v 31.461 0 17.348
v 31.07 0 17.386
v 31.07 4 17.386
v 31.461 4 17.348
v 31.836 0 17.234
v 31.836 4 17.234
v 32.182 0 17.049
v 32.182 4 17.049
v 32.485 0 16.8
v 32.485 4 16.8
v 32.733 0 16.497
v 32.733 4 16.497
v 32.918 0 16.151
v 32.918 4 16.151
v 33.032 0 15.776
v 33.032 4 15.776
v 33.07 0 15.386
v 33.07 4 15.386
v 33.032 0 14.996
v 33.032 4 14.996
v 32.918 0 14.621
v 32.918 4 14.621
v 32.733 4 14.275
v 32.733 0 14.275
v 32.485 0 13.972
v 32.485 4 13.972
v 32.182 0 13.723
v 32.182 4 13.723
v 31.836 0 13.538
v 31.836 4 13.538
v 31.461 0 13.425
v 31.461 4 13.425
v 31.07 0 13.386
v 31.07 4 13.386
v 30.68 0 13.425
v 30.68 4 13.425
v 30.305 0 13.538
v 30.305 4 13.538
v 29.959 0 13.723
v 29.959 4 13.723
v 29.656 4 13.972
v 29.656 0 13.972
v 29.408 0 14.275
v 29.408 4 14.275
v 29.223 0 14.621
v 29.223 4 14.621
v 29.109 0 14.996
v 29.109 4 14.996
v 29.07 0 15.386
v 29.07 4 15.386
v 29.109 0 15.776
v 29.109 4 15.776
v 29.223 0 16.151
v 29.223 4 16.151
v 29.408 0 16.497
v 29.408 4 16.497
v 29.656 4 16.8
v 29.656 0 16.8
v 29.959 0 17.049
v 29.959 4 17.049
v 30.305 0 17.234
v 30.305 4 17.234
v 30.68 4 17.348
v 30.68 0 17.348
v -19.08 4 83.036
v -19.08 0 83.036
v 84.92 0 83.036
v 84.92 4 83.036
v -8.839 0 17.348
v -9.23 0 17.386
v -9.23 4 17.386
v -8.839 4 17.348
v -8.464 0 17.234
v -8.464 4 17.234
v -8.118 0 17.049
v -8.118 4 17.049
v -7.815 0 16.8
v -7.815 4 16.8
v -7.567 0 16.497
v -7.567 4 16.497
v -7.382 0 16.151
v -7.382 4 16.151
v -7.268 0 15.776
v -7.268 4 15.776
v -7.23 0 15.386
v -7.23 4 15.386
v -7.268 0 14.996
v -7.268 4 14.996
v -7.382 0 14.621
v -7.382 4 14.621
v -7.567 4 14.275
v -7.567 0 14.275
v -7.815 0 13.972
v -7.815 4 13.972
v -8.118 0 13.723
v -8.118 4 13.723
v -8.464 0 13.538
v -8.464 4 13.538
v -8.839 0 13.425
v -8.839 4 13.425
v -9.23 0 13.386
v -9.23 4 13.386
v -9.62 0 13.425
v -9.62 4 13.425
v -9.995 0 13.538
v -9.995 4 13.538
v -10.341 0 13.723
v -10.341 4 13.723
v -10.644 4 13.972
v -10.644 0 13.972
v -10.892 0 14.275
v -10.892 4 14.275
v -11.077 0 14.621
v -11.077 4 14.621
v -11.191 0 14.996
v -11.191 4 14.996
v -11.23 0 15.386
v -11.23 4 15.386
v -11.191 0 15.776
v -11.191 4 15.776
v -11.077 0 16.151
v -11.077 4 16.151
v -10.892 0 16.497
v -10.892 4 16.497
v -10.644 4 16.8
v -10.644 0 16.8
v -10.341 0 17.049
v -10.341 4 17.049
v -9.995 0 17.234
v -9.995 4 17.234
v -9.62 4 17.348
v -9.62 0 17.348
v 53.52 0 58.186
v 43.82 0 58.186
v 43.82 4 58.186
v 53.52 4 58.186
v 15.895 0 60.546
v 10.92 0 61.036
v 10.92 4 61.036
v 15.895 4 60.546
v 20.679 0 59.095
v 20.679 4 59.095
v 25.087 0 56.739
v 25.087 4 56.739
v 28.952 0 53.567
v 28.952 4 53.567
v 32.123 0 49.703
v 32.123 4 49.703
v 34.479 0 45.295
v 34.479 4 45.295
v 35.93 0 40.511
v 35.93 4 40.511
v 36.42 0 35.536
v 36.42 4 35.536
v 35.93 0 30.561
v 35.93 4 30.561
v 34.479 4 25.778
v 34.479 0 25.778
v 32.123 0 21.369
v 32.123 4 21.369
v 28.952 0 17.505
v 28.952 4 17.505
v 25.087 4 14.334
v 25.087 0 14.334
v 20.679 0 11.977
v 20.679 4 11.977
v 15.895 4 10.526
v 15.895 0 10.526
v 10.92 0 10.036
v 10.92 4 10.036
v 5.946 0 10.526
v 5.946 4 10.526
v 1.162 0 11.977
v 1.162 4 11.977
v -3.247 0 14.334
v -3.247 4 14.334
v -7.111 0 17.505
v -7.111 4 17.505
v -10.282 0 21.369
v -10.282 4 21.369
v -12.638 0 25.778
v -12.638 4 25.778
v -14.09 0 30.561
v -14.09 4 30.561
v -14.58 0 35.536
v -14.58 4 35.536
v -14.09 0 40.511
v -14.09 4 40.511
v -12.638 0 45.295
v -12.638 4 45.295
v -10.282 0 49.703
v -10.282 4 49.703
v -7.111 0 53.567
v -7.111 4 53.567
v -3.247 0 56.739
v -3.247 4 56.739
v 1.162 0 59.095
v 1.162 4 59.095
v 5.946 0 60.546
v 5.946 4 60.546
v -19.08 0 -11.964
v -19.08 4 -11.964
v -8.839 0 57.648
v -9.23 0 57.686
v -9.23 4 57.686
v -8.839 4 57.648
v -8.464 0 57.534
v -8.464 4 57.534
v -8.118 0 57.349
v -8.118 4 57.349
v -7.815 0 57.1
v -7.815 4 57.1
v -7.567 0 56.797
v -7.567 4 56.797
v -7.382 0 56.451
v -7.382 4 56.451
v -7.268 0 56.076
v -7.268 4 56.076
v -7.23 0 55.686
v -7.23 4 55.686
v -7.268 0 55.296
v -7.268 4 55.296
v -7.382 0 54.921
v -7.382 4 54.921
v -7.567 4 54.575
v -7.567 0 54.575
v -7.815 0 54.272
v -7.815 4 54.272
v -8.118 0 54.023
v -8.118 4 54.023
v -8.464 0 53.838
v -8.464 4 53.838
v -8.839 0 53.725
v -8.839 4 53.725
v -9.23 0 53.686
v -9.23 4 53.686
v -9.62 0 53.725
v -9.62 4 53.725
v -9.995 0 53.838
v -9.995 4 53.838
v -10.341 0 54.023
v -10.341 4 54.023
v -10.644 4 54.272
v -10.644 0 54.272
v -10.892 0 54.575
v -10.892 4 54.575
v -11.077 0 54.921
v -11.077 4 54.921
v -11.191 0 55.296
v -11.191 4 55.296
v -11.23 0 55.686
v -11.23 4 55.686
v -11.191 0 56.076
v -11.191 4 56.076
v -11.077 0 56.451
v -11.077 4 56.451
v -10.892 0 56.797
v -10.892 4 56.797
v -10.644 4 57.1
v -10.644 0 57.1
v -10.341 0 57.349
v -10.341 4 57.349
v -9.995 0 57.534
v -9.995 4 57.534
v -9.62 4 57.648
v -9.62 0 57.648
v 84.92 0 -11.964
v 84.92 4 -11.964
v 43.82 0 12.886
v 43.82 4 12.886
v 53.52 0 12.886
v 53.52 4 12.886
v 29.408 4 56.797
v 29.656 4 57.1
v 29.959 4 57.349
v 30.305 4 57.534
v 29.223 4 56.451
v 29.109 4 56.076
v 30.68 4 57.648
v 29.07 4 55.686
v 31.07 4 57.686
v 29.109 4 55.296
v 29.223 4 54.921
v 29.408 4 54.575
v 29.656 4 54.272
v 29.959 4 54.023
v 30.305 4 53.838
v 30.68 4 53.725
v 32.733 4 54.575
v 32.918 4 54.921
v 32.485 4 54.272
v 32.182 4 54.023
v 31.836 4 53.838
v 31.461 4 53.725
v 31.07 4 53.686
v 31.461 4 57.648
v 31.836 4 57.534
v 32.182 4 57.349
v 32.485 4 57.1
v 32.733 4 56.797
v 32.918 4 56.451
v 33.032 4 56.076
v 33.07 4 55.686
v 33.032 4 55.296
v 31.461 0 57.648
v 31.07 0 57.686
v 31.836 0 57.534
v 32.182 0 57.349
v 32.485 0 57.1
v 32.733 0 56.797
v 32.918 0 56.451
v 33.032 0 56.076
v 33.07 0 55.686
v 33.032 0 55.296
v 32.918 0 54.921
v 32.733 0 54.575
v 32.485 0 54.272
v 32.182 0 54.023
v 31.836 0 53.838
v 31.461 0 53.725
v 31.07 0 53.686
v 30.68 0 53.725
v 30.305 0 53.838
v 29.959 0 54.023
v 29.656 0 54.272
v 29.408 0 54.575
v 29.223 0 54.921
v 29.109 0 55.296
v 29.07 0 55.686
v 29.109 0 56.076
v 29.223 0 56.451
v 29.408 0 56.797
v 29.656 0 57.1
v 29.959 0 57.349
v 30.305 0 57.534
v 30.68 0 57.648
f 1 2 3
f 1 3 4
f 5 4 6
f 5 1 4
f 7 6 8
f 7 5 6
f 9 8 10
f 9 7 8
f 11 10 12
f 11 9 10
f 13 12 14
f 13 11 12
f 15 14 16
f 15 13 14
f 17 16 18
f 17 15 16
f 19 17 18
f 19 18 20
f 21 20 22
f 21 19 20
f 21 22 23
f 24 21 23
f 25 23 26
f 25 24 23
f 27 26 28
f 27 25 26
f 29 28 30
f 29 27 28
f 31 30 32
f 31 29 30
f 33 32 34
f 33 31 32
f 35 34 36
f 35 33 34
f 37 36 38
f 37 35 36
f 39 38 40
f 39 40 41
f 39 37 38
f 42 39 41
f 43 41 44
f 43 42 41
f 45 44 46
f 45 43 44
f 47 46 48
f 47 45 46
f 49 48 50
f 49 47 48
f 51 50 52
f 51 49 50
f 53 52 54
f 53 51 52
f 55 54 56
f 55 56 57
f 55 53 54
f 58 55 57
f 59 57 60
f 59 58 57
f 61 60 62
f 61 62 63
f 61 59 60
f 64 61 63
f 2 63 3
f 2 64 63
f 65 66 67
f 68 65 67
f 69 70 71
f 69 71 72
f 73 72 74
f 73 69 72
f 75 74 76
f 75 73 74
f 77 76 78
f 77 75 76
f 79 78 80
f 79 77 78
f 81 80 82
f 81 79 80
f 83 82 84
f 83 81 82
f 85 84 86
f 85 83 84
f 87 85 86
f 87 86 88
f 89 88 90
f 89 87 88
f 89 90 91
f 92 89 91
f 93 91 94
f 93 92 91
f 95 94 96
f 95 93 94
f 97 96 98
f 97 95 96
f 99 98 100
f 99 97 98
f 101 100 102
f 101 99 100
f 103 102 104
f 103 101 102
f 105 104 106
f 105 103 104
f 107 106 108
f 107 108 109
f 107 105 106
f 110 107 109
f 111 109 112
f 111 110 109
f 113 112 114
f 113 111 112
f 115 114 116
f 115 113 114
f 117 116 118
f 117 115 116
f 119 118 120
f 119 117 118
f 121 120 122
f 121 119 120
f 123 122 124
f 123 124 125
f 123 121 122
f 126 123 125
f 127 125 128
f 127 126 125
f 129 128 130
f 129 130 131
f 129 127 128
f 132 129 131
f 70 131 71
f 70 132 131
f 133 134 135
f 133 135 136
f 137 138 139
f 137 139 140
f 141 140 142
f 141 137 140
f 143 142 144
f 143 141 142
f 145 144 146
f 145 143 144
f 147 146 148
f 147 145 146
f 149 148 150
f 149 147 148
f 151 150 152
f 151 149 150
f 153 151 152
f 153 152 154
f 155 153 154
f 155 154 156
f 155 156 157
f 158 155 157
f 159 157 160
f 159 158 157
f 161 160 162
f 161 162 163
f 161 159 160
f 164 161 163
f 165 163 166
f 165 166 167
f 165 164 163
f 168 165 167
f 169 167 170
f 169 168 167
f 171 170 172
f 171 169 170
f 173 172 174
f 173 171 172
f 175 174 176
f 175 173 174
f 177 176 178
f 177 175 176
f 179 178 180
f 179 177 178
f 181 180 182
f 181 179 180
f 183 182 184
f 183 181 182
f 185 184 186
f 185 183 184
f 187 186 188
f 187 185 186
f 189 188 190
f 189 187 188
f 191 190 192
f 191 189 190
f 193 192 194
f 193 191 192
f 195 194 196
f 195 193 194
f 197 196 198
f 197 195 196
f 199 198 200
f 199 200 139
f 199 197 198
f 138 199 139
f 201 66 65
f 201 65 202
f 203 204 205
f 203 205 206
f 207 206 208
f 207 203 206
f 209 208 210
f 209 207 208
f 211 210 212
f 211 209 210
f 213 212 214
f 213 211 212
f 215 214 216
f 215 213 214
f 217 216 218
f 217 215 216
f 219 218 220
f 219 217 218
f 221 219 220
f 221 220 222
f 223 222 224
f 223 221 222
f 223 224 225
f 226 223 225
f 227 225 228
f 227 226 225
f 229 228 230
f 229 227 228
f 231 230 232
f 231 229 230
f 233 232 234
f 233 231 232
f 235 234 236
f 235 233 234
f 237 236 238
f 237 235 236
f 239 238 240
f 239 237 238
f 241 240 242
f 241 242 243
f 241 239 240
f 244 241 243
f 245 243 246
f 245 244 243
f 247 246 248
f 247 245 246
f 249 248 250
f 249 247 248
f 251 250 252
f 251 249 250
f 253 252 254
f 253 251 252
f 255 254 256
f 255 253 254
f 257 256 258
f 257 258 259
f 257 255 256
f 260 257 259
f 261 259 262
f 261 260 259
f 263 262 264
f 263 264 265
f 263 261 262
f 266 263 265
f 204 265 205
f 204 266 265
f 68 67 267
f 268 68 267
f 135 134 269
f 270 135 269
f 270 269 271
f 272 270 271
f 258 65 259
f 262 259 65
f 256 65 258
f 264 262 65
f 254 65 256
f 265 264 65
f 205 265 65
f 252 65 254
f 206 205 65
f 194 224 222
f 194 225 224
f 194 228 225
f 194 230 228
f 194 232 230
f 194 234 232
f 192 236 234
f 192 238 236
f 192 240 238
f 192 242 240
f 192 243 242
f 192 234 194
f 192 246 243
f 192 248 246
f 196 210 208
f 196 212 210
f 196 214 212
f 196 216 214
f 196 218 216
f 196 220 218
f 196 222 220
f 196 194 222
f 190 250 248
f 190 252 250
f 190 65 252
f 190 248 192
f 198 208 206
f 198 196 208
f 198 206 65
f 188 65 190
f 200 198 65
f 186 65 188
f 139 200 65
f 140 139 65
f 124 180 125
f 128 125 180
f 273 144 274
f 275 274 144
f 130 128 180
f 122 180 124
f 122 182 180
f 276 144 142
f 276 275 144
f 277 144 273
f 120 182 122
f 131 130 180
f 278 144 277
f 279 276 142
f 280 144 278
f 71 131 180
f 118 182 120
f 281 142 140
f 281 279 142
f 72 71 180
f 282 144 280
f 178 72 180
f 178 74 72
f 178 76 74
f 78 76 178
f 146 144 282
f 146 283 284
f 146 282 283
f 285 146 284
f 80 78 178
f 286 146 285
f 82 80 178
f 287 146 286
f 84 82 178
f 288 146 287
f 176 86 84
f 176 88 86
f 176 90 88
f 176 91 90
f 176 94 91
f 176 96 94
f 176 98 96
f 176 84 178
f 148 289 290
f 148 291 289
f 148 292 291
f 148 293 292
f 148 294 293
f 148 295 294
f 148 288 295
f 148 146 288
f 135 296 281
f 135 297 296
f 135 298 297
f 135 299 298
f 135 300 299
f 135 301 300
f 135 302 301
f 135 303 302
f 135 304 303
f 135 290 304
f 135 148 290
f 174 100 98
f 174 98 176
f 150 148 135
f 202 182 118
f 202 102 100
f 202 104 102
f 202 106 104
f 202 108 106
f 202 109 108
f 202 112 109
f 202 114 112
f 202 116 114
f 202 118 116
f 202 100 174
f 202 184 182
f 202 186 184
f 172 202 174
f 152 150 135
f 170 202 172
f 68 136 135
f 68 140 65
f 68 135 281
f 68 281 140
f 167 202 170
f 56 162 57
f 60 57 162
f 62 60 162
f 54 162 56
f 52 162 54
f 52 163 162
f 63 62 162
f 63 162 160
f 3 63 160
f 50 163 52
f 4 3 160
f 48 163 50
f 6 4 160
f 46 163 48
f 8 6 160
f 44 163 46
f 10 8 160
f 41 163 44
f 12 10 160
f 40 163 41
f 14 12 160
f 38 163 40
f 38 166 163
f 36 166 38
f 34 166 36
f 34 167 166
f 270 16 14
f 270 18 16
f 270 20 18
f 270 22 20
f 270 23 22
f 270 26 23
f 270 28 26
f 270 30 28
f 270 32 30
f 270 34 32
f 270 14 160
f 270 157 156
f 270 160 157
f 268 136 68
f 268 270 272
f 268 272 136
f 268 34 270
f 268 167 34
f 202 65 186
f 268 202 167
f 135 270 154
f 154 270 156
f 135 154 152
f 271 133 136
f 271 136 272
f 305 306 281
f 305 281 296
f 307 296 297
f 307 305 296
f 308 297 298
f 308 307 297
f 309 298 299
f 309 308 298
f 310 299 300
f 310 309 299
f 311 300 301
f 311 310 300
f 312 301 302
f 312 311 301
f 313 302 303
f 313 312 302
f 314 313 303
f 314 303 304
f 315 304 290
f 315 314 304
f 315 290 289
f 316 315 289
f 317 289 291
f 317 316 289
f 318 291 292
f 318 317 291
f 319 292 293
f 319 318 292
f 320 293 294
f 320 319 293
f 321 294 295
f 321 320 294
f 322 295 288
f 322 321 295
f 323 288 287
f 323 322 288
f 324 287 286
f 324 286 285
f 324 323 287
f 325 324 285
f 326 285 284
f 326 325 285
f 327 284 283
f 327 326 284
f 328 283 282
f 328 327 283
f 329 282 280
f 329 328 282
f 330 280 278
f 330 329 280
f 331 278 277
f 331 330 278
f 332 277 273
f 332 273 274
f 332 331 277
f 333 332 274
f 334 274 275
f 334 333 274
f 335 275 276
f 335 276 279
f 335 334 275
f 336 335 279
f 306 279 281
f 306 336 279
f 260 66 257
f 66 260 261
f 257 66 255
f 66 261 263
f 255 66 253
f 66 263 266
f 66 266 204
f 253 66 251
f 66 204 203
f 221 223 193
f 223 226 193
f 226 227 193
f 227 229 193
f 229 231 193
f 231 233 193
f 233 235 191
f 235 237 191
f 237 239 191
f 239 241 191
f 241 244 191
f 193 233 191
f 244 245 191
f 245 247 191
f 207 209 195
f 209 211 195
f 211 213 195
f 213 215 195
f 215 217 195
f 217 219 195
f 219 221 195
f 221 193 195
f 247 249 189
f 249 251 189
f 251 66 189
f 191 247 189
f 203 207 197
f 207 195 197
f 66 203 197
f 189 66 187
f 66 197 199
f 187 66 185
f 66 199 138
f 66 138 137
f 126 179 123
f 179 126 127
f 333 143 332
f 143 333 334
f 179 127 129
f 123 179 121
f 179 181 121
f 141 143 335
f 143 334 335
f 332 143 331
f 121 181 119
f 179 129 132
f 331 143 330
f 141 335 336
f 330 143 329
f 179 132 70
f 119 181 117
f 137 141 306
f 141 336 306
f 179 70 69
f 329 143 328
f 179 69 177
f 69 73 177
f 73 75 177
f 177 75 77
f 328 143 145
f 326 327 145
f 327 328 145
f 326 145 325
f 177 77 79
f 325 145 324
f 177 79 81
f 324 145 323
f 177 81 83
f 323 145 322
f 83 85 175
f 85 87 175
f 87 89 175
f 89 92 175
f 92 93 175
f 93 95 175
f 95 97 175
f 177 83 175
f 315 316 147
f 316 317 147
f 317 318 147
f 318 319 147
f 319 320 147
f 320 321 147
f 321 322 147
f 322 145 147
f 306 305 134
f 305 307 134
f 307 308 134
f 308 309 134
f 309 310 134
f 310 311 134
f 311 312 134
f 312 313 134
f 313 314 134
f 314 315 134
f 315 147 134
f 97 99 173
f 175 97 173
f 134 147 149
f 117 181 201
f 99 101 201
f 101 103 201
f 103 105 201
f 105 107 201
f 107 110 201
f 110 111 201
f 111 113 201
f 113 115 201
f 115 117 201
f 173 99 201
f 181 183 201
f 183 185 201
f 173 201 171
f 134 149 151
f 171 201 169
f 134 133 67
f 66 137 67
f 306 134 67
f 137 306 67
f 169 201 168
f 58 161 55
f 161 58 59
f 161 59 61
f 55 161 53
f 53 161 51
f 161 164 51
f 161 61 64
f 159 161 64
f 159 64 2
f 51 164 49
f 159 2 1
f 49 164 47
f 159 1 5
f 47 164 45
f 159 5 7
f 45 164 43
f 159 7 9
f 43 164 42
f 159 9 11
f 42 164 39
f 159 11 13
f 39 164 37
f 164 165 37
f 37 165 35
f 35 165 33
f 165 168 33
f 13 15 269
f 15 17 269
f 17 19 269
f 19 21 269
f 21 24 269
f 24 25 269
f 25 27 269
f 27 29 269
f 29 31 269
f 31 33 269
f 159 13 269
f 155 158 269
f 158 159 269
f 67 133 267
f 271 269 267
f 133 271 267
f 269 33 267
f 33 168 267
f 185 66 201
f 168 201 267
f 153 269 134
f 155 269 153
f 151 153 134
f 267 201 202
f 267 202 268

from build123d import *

# Parameters (mm, degrees)
SKETCH1_W           = 104
SKETCH1_H           = 95
SKETCH1_R           = 25.5
SKETCH1_R_2         = 2
SKETCH1_W_2         = 9.7
SKETCH1_H_2         = 45.3
BOSS_EXTRUDE1_DEPTH = 4


with BuildPart() as part:
    # Sketch1 → Boss-Extrude1 (new body)
    with BuildSketch(Plane(origin=(0, 0, 0), x_dir=(1, 0, 0), z_dir=(0, 1, 0))):
        with Locations((32.920457223, -35.53611465)):
            Rectangle(SKETCH1_W, SKETCH1_H)
        with Locations(Location((10.920457223, -35.53611465, 0), (0, 0, 270))):
            Circle(SKETCH1_R, mode=Mode.SUBTRACT)
        with Locations(Location((-9.229542777, -15.38611465, 0), (0, 0, 270))):
            Circle(SKETCH1_R_2, mode=Mode.SUBTRACT)
        with Locations(Location((-9.229542777, -55.68611465, 0), (0, 0, 270))):
            Circle(SKETCH1_R_2, mode=Mode.SUBTRACT)
        with Locations(Location((31.070457223, -55.68611465, 0), (0, 0, 270))):
            Circle(SKETCH1_R_2, mode=Mode.SUBTRACT)
        with Locations(Location((31.070457223, -15.38611465, 0), (0, 0, 270))):
            Circle(SKETCH1_R_2, mode=Mode.SUBTRACT)
        with Locations((48.670457223, -35.53611465)):
            Rectangle(SKETCH1_W_2, SKETCH1_H_2, mode=Mode.SUBTRACT)
    extrude(amount=BOSS_EXTRUDE1_DEPTH)


solid = part.part
